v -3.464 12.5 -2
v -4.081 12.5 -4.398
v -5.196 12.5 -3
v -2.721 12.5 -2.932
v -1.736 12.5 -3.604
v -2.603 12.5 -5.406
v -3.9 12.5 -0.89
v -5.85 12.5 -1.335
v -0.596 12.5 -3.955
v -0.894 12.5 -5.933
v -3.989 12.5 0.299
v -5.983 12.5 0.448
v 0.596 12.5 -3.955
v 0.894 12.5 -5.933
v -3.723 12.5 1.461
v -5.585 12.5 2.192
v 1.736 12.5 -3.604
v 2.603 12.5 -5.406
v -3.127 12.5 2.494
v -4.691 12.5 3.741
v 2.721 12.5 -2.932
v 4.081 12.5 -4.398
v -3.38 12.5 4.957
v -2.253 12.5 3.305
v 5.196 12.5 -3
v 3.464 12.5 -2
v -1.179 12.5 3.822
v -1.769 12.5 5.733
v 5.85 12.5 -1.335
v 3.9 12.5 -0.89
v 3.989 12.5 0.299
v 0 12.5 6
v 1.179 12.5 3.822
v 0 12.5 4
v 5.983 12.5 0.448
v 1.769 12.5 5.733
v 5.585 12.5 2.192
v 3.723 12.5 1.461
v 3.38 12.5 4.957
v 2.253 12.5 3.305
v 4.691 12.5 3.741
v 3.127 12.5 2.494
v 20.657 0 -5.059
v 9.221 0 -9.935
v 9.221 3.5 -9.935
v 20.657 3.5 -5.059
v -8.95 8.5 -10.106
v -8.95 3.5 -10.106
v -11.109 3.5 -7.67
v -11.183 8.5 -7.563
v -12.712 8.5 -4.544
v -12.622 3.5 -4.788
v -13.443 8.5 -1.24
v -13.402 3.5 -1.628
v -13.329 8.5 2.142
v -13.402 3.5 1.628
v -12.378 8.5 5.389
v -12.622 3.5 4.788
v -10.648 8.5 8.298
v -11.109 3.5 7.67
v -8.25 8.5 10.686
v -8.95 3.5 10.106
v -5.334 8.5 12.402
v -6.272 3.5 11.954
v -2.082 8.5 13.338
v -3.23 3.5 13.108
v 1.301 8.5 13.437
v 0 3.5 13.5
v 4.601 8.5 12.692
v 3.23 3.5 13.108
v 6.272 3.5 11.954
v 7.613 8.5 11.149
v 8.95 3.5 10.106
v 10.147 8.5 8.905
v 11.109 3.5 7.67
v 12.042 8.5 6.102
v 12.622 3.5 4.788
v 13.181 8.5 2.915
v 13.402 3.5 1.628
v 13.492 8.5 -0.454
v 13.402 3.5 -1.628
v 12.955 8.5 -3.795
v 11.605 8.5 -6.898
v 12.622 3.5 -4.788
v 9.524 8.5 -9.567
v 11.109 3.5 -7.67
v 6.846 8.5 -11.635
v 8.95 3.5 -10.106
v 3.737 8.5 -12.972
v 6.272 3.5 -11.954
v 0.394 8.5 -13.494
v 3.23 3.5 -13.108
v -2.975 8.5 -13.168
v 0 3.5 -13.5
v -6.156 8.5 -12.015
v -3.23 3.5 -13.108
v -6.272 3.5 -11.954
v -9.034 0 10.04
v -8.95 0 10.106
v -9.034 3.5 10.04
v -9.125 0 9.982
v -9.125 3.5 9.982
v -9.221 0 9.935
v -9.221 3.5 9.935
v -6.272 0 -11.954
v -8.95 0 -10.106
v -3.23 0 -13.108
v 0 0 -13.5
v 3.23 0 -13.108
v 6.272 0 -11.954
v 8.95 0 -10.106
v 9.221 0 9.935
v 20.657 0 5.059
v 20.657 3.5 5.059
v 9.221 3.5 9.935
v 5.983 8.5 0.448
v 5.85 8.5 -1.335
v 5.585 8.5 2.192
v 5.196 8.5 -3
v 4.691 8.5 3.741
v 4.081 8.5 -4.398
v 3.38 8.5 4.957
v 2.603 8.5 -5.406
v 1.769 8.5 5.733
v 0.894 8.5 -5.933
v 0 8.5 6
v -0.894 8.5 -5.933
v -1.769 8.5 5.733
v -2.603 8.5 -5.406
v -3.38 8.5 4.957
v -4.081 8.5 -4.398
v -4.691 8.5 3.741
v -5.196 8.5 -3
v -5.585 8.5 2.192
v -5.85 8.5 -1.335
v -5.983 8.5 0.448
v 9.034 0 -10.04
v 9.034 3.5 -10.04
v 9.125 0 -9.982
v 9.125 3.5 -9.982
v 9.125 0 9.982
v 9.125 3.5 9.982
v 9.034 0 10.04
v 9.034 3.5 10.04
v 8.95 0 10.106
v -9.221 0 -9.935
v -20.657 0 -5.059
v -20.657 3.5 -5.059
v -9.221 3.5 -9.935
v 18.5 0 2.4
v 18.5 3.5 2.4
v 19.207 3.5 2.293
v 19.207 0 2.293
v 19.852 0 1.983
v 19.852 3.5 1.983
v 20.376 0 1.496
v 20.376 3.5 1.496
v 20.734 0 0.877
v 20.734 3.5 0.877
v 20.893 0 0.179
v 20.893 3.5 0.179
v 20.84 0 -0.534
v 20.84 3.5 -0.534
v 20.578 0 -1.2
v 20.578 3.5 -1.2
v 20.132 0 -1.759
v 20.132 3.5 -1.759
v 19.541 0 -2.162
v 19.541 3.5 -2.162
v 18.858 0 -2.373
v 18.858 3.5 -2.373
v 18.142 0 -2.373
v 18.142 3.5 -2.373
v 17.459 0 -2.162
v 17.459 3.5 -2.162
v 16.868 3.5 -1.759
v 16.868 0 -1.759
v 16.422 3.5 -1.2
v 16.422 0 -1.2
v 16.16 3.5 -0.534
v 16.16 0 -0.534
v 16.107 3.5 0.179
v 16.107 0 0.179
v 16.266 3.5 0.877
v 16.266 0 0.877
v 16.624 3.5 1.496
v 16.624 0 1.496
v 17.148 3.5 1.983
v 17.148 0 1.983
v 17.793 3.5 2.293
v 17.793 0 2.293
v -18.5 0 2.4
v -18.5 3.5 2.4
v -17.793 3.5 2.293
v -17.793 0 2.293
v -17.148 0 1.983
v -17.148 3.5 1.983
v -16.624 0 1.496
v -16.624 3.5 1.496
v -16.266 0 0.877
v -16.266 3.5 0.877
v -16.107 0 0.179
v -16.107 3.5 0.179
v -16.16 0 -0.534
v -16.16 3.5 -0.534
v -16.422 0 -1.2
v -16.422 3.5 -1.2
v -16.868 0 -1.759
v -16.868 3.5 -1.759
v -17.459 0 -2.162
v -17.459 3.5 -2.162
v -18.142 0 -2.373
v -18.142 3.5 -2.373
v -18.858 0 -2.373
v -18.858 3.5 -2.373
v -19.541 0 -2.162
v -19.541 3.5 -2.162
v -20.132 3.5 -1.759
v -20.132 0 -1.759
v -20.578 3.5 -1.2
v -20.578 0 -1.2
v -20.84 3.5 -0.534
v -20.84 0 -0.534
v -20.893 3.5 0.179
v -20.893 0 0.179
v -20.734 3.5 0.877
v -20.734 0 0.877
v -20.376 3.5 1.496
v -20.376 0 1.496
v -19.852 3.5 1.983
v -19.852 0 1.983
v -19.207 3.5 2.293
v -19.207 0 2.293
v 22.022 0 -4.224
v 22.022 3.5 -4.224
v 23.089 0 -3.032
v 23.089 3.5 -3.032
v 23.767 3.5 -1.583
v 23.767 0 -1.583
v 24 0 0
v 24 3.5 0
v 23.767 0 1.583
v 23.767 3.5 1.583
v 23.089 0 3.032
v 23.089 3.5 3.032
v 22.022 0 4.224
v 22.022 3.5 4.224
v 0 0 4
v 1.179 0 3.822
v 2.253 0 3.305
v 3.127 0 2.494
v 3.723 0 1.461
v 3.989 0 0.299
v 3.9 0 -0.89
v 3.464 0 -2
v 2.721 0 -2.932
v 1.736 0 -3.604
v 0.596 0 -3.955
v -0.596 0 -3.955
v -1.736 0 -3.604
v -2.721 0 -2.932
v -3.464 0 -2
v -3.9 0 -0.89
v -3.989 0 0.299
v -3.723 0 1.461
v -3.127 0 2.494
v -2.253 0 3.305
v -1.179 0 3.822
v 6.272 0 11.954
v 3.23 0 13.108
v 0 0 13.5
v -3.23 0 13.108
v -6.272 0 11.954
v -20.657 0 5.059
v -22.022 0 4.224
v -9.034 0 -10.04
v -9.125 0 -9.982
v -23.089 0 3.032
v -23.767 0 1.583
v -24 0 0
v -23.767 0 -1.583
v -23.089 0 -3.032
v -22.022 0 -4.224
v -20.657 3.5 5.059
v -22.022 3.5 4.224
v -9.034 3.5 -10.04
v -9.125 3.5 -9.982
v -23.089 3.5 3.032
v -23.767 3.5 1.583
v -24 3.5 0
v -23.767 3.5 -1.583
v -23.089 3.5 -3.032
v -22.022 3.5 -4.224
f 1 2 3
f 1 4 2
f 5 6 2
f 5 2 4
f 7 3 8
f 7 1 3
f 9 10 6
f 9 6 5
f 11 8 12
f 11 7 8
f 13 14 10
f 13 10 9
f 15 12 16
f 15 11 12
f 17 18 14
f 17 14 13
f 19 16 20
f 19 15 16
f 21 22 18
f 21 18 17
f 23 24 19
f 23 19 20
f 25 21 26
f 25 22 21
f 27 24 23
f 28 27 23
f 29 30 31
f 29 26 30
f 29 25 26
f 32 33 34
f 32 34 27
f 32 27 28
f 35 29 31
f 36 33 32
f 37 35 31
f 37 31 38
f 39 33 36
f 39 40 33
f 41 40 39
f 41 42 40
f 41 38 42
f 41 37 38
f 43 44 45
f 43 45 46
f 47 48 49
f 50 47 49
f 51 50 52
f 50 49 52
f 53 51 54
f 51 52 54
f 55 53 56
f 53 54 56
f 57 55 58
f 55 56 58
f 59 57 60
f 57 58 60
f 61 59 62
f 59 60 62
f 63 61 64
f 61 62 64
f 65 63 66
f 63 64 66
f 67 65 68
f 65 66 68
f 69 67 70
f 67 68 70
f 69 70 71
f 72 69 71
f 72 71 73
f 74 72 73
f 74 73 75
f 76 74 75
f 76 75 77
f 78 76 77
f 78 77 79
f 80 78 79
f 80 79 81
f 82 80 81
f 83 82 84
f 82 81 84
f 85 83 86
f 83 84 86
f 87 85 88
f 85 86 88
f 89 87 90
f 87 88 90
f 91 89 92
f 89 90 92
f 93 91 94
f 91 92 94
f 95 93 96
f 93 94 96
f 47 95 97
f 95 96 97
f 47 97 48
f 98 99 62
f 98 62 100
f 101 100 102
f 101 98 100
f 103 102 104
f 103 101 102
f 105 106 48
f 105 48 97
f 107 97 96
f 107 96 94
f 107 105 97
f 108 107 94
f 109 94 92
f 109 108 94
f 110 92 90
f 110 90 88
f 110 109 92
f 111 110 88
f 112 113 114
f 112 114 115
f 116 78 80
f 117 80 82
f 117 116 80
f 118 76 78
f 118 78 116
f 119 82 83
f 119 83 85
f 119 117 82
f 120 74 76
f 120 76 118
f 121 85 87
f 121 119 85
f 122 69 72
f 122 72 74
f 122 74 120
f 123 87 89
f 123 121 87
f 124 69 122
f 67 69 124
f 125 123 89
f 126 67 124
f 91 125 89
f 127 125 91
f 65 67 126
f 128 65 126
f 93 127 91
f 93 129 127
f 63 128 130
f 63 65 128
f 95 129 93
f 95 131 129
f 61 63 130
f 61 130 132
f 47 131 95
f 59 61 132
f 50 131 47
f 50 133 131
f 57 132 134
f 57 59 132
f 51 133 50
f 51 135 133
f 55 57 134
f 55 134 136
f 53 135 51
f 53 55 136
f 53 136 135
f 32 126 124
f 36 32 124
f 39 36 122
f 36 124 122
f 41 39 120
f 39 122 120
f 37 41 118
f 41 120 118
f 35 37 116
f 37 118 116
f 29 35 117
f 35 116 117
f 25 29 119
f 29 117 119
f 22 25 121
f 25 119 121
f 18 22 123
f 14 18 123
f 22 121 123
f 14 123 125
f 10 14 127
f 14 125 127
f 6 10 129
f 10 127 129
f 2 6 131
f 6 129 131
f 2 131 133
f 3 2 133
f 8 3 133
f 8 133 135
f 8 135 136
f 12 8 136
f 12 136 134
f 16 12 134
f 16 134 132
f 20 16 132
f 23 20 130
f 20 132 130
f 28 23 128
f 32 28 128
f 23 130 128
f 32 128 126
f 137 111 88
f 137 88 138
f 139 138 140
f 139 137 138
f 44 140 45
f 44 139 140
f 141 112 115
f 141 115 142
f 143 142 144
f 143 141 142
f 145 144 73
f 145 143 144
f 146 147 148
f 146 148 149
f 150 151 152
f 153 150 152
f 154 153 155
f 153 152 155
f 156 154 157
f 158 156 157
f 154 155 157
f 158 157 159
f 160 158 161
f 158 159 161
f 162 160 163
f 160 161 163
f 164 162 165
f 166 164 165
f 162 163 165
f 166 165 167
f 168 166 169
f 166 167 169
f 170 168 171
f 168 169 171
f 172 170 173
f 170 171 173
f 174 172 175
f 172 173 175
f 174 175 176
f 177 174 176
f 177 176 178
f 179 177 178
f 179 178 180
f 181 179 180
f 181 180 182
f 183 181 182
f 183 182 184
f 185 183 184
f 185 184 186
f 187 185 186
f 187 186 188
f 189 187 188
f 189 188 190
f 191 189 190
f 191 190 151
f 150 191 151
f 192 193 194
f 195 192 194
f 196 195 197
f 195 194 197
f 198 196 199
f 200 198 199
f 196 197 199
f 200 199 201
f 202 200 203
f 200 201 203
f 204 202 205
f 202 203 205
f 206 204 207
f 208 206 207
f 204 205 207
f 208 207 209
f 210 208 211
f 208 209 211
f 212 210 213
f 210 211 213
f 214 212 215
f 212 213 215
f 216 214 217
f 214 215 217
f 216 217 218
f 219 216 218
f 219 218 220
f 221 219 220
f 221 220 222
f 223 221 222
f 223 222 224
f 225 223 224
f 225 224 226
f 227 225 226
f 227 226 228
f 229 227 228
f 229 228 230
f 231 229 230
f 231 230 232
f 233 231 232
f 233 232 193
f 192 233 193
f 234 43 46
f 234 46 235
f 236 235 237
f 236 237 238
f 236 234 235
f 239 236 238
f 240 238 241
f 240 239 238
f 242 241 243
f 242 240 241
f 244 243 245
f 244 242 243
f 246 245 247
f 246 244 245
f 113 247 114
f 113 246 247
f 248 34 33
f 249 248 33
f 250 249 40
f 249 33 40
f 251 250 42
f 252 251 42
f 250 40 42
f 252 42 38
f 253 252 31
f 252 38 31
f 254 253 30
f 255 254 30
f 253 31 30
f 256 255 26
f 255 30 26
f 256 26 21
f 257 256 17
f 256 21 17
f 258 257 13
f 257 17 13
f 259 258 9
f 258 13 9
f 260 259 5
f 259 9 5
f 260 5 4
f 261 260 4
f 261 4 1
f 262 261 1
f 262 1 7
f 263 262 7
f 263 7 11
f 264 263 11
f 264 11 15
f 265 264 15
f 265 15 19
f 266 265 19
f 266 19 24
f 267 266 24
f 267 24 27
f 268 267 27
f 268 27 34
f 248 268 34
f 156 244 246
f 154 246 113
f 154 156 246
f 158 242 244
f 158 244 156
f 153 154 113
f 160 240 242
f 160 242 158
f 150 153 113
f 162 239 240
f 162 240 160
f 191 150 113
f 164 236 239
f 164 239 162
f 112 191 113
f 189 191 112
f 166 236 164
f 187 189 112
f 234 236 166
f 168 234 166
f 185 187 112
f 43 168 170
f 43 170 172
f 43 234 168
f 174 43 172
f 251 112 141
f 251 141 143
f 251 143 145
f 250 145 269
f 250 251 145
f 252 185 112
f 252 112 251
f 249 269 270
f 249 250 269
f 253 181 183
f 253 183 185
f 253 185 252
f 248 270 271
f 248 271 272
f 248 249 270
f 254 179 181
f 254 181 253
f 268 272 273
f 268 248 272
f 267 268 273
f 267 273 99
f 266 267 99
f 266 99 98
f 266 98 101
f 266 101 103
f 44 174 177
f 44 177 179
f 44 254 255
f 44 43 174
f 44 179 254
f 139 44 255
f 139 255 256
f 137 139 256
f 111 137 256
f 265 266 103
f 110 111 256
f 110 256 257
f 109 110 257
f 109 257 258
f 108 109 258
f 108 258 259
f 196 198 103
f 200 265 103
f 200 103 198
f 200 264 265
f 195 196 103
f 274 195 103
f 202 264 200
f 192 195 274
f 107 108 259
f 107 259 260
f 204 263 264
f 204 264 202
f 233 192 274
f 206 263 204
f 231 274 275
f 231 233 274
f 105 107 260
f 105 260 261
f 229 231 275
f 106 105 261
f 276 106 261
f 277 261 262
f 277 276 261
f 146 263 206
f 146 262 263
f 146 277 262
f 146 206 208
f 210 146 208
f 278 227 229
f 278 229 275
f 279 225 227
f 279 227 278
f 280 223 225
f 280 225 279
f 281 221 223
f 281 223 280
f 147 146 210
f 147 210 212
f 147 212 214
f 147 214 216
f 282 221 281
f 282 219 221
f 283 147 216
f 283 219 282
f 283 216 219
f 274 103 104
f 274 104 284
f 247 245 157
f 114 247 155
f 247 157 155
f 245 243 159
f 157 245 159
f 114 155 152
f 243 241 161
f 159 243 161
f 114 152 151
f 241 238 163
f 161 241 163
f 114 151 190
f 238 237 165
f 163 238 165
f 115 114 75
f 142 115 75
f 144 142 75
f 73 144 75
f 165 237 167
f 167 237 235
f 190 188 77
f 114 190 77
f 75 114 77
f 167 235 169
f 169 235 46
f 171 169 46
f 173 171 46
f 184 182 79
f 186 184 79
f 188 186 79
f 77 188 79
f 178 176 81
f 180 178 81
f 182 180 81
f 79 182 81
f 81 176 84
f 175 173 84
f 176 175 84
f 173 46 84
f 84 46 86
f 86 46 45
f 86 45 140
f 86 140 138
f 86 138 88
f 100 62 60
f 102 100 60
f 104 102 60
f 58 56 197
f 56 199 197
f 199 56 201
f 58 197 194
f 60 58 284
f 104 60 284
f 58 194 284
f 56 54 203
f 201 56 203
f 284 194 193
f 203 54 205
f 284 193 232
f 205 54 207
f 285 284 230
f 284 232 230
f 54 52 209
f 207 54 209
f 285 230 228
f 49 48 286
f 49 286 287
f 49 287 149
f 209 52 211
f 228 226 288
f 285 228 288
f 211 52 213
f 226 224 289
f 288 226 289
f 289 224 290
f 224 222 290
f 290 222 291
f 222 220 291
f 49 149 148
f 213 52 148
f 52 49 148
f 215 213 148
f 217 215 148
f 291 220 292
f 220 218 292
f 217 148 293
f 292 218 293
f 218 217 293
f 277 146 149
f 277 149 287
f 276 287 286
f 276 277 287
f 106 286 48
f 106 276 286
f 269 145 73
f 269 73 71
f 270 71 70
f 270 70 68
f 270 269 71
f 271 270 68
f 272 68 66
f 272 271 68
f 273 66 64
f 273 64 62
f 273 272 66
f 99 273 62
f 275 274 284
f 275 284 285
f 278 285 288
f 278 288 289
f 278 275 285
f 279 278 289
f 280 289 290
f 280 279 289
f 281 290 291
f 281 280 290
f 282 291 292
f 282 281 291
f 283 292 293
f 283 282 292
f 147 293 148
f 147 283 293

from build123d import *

# Parameters (mm, degrees)
BOSS_EXTRUDE1_DEPTH = 3.5
SKETCH2_R           = 13.5
BOSS_EXTRUDE2_DEPTH = 5
SKETCH3_R           = 6
BOSS_EXTRUDE3_DEPTH = 4
SKETCH4_R           = 4
CUT_EXTRUDE1_DEPTH  = 31.24070105
SKETCH5_R           = 2.4
CUT_EXTRUDE2_DEPTH  = 29.969811874


with BuildPart() as part:
    # Sketch1 → Boss-Extrude1 (new body)
    with BuildSketch(Plane(origin=(0, 0, 0), x_dir=(1, 0, 0), z_dir=(0, 1, 0))):
        with BuildLine():
            Line((-20.657112668, 5.059334436), (-9.221211054, 9.935178986))
            ThreePointArc((-9.221211054, 9.935178986), (-9.078911878, 10.009890435), (-8.950419333, 10.106433286))
            ThreePointArc((-8.950419333, 10.106433286), (0, 13.5), (8.950419333, 10.106433286))
            ThreePointArc((8.950419333, 10.106433286), (9.078911878, 10.009890435), (9.221211054, 9.935178986))
            Line((9.221211054, 9.935178986), (20.657112668, 5.059334436))
            ThreePointArc((20.657112668, 5.059334436), (24, 0), (20.657112668, -5.059334436))
            Line((20.657112668, -5.059334436), (9.221211054, -9.935178986))
            ThreePointArc((9.221211054, -9.935178986), (9.078911878, -10.009890435), (8.950419333, -10.106433286))
            ThreePointArc((8.950419333, -10.106433286), (0, -13.5), (-8.950419333, -10.106433286))
            ThreePointArc((-8.950419333, -10.106433286), (-9.078911878, -10.009890435), (-9.221211054, -9.935178986))
            Line((-9.221211054, -9.935178986), (-20.657112668, -5.059334436))
            ThreePointArc((-20.657112668, -5.059334436), (-24, 0), (-20.657112668, 5.059334436))
        make_face()
    extrude(amount=BOSS_EXTRUDE1_DEPTH)

    # Sketch2 → Boss-Extrude2 (add)
    with BuildSketch(Plane(origin=(0, 3.5, 0), x_dir=(1, 0, 0), z_dir=(0, 1, 0))):
        with Locations(Location((0, 0, 0), (0, 0, 131.528615852))):
            Circle(SKETCH2_R)
    extrude(amount=BOSS_EXTRUDE2_DEPTH)

    # Sketch3 → Boss-Extrude3 (add)
    with BuildSketch(Plane(origin=(0, 8.5, 0), x_dir=(1, 0, 0), z_dir=(0, 1, 0))):
        with Locations(Location((0, 0, 0), (0, 0, 270))):
            Circle(SKETCH3_R)
    extrude(amount=BOSS_EXTRUDE3_DEPTH)

    # Sketch4 → Cut-Extrude1 (cut, through all)
    with BuildSketch(Plane(origin=(0, 12.5, 0), x_dir=(1, 0, 0), z_dir=(0, 1, 0))):
        with Locations(Location((0, 0, 0), (0, 0, 270))):
            Circle(SKETCH4_R)
    extrude(amount=-CUT_EXTRUDE1_DEPTH, mode=Mode.SUBTRACT)

    # Sketch5 → Cut-Extrude2 (cut, through all)
    with BuildSketch(Plane(origin=(0, 3.5, 0), x_dir=(1, 0, 0), z_dir=(0, 1, 0))):
        with Locations(Location((-18.5, 0, 0), (0, 0, 270))):
            Circle(SKETCH5_R)
        with Locations(Location((18.5, 0, 0), (0, 0, 270))):
            Circle(SKETCH5_R)
    extrude(amount=-CUT_EXTRUDE2_DEPTH, mode=Mode.SUBTRACT)


solid = part.part
